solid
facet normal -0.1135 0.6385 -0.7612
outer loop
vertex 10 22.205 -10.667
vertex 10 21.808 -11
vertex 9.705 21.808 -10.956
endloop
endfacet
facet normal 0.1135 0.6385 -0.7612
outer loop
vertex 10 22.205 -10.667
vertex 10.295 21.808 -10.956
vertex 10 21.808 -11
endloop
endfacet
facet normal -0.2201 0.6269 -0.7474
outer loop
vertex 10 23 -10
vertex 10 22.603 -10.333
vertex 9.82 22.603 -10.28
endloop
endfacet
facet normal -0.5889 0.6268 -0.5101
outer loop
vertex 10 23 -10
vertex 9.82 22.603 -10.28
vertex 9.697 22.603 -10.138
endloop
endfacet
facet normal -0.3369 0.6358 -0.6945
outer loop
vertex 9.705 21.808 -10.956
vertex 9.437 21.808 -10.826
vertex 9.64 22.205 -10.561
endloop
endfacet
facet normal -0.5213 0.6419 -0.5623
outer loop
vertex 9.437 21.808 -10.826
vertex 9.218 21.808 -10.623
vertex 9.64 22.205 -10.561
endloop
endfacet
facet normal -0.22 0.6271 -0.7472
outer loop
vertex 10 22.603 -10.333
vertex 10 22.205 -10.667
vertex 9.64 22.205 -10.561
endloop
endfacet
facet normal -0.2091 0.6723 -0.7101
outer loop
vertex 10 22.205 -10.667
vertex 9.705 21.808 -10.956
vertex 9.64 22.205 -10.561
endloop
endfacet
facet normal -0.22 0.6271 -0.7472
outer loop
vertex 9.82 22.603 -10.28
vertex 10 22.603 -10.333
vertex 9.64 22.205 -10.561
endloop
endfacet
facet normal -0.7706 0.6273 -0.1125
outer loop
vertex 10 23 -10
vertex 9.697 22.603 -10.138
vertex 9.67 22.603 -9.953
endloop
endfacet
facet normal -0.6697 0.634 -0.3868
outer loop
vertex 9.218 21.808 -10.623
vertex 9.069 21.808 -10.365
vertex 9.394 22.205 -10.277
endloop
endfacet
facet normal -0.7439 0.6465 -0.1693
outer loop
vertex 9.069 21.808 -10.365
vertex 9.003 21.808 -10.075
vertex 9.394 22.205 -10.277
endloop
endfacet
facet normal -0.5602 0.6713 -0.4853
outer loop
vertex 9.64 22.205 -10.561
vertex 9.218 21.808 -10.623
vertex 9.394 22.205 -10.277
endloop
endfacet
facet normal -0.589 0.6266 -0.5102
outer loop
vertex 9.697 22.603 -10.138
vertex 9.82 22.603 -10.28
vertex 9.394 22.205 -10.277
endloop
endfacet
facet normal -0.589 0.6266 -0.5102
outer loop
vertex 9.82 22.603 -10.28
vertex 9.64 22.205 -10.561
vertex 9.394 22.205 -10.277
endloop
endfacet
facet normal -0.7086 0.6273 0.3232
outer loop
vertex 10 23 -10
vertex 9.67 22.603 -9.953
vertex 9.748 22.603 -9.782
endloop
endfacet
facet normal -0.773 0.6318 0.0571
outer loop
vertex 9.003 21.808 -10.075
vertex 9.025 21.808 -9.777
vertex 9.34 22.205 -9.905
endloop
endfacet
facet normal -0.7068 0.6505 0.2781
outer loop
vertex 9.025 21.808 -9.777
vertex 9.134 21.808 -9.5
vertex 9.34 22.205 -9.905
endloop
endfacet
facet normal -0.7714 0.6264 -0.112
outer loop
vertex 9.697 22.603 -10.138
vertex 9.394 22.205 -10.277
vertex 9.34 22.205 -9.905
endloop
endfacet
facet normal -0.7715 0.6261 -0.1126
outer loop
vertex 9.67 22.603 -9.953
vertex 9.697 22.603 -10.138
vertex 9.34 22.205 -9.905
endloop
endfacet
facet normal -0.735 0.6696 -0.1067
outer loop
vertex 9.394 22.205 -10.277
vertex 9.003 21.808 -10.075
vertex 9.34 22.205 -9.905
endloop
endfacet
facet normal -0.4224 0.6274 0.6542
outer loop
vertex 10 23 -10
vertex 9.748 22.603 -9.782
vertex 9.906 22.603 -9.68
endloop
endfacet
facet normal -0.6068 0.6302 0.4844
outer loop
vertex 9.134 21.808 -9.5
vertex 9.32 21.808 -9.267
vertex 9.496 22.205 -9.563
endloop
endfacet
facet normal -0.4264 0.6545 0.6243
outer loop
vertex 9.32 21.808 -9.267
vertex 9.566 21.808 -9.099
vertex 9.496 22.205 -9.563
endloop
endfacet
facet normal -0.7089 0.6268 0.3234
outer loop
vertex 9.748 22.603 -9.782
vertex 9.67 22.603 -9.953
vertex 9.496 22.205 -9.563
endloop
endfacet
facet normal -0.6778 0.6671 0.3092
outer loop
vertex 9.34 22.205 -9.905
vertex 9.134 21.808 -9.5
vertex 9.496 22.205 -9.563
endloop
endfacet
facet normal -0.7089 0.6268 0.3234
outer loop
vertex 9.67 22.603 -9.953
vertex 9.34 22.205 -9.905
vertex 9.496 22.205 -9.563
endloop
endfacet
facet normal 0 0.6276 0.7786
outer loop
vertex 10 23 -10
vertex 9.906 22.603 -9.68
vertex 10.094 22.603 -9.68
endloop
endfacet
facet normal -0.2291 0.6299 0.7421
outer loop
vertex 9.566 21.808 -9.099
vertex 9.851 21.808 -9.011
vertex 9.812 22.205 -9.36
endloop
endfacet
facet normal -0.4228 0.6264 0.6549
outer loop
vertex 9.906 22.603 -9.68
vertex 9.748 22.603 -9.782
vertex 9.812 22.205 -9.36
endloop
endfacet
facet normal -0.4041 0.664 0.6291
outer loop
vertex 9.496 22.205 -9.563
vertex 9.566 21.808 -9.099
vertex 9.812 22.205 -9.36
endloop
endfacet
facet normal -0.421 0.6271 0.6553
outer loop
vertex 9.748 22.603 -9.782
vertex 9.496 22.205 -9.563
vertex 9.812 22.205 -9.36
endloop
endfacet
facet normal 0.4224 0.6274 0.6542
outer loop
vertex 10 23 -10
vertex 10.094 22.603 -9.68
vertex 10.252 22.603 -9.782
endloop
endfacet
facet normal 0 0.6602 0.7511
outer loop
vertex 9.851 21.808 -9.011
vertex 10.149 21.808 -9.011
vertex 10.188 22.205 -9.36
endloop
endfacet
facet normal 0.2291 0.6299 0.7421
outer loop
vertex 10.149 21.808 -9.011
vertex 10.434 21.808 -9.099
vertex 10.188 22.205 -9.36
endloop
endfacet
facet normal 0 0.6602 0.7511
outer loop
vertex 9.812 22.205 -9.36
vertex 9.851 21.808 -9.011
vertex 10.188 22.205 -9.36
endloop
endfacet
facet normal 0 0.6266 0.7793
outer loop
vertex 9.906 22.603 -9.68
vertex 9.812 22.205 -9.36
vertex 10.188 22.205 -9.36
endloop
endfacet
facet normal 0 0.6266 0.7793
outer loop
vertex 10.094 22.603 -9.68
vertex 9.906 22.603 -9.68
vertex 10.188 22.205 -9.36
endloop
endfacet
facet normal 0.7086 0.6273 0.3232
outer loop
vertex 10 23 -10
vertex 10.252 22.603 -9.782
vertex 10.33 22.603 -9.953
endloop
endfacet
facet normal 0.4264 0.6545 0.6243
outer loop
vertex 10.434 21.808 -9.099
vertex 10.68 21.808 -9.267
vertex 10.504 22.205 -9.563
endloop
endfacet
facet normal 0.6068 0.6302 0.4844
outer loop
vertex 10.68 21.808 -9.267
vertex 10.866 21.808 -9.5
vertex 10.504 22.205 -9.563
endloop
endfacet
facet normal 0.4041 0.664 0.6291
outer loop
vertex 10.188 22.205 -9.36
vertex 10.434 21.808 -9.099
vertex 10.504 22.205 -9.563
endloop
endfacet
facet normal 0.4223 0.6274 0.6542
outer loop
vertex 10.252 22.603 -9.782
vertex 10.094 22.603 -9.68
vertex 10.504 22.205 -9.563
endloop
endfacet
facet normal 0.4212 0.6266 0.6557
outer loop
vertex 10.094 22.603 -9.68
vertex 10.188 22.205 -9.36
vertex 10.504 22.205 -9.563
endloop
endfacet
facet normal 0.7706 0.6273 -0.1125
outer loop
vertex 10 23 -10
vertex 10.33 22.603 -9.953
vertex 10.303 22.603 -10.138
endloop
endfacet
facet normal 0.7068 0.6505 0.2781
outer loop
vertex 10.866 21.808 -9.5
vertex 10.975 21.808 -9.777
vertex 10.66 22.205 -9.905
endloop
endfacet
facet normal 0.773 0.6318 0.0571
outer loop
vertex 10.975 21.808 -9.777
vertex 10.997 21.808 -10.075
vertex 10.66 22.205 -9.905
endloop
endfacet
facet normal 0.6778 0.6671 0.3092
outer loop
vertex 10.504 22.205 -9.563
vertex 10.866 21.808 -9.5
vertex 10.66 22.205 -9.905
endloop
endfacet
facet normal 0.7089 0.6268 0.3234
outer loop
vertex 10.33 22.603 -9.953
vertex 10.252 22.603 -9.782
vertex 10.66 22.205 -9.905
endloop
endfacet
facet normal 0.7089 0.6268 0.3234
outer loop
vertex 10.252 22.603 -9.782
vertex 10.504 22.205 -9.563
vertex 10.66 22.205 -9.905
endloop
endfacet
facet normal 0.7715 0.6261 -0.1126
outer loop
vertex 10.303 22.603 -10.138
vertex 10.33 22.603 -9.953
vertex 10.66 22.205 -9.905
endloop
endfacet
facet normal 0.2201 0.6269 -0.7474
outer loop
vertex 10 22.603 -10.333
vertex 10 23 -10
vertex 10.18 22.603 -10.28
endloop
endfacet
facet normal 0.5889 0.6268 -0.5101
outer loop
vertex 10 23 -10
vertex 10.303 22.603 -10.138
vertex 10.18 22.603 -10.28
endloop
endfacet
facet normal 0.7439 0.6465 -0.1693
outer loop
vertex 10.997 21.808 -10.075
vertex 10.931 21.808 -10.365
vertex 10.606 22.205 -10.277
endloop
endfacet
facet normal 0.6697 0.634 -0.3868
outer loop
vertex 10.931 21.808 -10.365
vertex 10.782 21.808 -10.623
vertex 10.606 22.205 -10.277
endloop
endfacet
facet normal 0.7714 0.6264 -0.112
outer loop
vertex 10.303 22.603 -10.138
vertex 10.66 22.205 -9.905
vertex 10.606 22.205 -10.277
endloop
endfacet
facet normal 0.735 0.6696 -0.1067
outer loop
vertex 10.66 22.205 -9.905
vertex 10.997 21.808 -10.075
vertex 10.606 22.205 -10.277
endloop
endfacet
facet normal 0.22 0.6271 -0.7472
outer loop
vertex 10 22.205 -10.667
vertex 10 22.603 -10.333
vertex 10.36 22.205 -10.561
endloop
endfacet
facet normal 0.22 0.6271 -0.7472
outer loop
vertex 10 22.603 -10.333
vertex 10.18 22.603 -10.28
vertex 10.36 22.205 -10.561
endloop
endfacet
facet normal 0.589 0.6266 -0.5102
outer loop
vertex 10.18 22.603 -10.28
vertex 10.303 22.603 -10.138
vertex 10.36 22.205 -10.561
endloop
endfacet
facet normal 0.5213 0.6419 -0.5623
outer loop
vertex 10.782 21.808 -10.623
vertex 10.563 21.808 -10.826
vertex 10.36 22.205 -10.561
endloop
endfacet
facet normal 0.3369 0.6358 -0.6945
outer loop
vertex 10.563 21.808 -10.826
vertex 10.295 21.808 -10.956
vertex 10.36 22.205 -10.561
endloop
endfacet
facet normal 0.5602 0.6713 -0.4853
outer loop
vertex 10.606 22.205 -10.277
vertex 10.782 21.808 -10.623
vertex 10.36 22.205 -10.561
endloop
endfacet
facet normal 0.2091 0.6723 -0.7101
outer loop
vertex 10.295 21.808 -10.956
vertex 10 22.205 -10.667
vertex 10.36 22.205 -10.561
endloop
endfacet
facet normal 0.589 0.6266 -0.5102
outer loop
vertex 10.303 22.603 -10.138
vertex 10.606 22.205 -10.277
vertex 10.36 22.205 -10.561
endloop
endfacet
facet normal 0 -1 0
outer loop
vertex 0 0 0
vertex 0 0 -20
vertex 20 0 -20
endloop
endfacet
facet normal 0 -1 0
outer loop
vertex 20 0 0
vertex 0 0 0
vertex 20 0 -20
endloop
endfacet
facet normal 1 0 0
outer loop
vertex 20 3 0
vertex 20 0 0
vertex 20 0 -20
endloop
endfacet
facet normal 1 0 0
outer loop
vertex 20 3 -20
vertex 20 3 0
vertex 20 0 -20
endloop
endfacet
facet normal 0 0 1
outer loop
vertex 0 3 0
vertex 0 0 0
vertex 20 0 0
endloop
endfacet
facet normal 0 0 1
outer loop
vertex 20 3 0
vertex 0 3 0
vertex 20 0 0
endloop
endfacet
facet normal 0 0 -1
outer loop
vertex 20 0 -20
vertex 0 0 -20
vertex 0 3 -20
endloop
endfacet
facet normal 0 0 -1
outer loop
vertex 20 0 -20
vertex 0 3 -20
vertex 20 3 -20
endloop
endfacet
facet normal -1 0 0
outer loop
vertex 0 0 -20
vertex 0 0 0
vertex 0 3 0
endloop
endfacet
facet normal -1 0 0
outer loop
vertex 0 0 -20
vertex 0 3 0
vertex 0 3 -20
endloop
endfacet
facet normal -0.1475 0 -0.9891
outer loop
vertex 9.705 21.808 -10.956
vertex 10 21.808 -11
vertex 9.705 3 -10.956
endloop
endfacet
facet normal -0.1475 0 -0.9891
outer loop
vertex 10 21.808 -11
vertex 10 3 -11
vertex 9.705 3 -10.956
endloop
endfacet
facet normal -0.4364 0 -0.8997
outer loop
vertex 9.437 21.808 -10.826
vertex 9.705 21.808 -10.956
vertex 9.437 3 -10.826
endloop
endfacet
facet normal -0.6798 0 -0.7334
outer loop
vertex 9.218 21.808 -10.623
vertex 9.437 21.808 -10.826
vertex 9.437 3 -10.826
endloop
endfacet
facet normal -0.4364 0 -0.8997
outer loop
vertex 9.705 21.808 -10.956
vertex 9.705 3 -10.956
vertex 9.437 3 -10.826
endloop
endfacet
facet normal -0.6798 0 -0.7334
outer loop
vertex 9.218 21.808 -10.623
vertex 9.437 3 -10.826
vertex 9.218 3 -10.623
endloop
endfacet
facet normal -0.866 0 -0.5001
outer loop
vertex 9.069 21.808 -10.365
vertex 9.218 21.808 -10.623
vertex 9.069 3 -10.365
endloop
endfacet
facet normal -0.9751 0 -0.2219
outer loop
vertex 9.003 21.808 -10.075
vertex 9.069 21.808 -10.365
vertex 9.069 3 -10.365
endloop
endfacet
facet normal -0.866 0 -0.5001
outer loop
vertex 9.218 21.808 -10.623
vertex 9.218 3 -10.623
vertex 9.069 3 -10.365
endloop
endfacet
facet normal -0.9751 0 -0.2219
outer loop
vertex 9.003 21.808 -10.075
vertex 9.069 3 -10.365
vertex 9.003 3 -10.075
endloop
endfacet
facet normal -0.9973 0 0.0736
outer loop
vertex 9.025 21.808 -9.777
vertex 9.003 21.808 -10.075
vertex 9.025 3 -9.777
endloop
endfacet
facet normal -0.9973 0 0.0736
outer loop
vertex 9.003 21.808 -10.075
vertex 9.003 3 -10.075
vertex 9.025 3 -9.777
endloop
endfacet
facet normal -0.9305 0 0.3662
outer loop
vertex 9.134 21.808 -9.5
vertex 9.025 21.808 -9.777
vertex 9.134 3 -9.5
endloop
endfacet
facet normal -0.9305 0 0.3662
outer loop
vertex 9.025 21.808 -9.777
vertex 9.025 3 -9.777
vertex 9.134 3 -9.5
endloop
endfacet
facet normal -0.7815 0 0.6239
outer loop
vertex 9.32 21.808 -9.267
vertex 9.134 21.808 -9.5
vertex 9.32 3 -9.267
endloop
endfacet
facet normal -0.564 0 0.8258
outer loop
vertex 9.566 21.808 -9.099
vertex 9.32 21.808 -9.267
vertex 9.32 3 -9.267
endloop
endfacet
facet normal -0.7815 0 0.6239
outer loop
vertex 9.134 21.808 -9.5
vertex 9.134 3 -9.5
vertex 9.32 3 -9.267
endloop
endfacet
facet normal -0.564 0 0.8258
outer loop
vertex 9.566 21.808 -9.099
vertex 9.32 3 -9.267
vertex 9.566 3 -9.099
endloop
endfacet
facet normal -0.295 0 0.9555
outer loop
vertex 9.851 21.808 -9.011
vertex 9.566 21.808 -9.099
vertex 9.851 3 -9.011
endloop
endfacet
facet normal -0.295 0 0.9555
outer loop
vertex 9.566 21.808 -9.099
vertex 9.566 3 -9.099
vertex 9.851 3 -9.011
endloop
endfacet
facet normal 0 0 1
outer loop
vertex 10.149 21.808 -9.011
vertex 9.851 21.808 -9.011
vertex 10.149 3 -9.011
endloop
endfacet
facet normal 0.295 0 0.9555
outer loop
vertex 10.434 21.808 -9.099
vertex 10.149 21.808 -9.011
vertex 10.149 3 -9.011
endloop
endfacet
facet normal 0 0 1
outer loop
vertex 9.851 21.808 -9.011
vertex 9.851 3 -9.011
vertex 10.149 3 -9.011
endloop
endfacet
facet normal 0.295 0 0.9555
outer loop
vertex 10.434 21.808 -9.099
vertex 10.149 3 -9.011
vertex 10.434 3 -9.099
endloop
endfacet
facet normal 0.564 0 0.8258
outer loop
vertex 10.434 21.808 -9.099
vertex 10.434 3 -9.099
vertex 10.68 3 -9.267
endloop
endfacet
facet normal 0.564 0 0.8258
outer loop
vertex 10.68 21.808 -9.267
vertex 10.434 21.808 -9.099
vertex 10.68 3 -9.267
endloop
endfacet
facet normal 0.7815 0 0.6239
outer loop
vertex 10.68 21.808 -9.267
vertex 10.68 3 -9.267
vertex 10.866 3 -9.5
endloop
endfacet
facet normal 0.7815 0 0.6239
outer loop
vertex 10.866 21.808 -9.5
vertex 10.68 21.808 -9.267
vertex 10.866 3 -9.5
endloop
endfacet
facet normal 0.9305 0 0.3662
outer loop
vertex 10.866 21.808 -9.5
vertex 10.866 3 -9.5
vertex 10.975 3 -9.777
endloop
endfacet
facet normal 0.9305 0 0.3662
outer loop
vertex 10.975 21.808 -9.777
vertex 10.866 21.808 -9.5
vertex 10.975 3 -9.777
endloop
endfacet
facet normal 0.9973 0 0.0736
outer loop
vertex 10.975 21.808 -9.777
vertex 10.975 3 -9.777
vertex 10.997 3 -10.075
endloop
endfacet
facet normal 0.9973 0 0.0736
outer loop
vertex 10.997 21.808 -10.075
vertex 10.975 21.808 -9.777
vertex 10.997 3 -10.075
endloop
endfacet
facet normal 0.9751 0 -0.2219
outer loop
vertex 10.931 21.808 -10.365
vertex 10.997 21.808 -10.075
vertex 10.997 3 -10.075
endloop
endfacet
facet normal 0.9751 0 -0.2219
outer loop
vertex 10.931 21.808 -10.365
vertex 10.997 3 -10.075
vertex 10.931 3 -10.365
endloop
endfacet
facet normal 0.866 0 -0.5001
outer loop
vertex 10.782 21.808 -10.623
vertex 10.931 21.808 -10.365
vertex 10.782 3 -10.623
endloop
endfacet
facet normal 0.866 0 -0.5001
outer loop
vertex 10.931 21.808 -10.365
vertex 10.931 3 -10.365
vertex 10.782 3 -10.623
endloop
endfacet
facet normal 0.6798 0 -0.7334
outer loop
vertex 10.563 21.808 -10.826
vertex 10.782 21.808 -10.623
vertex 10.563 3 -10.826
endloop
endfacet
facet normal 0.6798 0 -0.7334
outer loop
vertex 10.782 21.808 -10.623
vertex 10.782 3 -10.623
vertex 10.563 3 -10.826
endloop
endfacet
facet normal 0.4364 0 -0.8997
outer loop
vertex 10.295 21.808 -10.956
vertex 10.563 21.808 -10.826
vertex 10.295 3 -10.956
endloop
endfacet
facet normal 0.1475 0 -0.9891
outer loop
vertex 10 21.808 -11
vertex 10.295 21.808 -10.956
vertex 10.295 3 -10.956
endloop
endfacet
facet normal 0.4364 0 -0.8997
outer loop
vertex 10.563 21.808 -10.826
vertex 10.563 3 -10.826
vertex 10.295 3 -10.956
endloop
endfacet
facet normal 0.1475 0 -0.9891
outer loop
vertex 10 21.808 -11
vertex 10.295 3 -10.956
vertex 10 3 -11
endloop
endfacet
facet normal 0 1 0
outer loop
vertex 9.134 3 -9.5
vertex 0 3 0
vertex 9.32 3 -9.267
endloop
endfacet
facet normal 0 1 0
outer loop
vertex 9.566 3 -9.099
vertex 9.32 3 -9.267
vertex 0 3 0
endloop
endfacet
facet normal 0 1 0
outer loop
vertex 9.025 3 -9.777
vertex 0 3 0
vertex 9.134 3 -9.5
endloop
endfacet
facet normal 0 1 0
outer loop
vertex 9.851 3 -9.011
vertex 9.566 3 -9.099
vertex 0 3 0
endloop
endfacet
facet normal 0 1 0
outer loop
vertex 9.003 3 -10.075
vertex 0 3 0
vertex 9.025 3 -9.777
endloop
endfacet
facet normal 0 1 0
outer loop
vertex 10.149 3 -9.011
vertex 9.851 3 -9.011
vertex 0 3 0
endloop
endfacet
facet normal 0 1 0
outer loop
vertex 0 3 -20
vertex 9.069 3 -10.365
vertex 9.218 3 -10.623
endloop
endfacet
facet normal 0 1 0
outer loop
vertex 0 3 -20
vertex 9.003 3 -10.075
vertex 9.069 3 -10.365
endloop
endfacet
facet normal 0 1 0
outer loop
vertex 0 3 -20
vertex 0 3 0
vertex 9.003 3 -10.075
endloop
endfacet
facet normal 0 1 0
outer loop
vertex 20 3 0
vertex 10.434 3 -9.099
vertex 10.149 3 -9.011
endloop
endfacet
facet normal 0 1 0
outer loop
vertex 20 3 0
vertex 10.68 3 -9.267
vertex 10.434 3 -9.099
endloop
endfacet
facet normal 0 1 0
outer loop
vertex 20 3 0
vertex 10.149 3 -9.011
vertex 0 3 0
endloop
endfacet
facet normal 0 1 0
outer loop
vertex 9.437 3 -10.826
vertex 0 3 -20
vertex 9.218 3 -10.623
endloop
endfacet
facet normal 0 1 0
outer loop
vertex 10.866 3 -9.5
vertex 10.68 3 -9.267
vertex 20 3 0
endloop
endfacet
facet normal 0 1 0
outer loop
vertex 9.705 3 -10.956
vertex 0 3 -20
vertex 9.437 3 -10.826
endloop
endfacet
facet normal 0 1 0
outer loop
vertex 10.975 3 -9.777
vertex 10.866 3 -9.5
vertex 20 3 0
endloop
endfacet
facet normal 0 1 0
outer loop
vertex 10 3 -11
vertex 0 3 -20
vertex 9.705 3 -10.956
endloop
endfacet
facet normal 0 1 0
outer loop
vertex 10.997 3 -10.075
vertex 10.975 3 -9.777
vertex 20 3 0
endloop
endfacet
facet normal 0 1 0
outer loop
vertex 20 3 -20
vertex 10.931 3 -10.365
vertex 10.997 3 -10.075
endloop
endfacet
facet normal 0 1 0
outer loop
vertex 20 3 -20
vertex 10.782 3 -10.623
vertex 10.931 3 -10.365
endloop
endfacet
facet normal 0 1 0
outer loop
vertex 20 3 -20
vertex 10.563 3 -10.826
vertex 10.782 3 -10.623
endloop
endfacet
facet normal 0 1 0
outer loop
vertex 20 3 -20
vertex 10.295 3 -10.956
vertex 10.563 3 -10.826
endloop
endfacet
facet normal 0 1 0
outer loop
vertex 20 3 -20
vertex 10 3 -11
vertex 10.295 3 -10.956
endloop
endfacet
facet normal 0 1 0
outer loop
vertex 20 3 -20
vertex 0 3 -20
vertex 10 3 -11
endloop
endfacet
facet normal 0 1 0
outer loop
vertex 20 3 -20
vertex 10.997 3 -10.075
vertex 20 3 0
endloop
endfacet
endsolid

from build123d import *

# Parameters (mm, degrees)
CROQUIS1_W              = 20
CROQUIS1_H              = 20
SALIENTE_EXTRUIR1_DEPTH = 3


with BuildPart() as part:
    # Croquis1 → Saliente-Extruir1 (new body)
    with BuildSketch(Plane(origin=(0, 0, 0), x_dir=(1, 0, 0), z_dir=(0, 1, 0))):
        with Locations((10, 10)):
            Rectangle(CROQUIS1_W, CROQUIS1_H)
    extrude(amount=SALIENTE_EXTRUIR1_DEPTH)

    # Croquis2 → Revolución1 (revolve)
    with BuildSketch(Plane(origin=(10, 0, 0), x_dir=(0, 0, -1), z_dir=(1, 0, 0))):
        Polygon((10, 3), (10, 23), (11, 21.808246407), (11, 3), align=None)
    revolve(axis=Axis((10, 3, -10), (0, 1, 0)))


solid = part.part
